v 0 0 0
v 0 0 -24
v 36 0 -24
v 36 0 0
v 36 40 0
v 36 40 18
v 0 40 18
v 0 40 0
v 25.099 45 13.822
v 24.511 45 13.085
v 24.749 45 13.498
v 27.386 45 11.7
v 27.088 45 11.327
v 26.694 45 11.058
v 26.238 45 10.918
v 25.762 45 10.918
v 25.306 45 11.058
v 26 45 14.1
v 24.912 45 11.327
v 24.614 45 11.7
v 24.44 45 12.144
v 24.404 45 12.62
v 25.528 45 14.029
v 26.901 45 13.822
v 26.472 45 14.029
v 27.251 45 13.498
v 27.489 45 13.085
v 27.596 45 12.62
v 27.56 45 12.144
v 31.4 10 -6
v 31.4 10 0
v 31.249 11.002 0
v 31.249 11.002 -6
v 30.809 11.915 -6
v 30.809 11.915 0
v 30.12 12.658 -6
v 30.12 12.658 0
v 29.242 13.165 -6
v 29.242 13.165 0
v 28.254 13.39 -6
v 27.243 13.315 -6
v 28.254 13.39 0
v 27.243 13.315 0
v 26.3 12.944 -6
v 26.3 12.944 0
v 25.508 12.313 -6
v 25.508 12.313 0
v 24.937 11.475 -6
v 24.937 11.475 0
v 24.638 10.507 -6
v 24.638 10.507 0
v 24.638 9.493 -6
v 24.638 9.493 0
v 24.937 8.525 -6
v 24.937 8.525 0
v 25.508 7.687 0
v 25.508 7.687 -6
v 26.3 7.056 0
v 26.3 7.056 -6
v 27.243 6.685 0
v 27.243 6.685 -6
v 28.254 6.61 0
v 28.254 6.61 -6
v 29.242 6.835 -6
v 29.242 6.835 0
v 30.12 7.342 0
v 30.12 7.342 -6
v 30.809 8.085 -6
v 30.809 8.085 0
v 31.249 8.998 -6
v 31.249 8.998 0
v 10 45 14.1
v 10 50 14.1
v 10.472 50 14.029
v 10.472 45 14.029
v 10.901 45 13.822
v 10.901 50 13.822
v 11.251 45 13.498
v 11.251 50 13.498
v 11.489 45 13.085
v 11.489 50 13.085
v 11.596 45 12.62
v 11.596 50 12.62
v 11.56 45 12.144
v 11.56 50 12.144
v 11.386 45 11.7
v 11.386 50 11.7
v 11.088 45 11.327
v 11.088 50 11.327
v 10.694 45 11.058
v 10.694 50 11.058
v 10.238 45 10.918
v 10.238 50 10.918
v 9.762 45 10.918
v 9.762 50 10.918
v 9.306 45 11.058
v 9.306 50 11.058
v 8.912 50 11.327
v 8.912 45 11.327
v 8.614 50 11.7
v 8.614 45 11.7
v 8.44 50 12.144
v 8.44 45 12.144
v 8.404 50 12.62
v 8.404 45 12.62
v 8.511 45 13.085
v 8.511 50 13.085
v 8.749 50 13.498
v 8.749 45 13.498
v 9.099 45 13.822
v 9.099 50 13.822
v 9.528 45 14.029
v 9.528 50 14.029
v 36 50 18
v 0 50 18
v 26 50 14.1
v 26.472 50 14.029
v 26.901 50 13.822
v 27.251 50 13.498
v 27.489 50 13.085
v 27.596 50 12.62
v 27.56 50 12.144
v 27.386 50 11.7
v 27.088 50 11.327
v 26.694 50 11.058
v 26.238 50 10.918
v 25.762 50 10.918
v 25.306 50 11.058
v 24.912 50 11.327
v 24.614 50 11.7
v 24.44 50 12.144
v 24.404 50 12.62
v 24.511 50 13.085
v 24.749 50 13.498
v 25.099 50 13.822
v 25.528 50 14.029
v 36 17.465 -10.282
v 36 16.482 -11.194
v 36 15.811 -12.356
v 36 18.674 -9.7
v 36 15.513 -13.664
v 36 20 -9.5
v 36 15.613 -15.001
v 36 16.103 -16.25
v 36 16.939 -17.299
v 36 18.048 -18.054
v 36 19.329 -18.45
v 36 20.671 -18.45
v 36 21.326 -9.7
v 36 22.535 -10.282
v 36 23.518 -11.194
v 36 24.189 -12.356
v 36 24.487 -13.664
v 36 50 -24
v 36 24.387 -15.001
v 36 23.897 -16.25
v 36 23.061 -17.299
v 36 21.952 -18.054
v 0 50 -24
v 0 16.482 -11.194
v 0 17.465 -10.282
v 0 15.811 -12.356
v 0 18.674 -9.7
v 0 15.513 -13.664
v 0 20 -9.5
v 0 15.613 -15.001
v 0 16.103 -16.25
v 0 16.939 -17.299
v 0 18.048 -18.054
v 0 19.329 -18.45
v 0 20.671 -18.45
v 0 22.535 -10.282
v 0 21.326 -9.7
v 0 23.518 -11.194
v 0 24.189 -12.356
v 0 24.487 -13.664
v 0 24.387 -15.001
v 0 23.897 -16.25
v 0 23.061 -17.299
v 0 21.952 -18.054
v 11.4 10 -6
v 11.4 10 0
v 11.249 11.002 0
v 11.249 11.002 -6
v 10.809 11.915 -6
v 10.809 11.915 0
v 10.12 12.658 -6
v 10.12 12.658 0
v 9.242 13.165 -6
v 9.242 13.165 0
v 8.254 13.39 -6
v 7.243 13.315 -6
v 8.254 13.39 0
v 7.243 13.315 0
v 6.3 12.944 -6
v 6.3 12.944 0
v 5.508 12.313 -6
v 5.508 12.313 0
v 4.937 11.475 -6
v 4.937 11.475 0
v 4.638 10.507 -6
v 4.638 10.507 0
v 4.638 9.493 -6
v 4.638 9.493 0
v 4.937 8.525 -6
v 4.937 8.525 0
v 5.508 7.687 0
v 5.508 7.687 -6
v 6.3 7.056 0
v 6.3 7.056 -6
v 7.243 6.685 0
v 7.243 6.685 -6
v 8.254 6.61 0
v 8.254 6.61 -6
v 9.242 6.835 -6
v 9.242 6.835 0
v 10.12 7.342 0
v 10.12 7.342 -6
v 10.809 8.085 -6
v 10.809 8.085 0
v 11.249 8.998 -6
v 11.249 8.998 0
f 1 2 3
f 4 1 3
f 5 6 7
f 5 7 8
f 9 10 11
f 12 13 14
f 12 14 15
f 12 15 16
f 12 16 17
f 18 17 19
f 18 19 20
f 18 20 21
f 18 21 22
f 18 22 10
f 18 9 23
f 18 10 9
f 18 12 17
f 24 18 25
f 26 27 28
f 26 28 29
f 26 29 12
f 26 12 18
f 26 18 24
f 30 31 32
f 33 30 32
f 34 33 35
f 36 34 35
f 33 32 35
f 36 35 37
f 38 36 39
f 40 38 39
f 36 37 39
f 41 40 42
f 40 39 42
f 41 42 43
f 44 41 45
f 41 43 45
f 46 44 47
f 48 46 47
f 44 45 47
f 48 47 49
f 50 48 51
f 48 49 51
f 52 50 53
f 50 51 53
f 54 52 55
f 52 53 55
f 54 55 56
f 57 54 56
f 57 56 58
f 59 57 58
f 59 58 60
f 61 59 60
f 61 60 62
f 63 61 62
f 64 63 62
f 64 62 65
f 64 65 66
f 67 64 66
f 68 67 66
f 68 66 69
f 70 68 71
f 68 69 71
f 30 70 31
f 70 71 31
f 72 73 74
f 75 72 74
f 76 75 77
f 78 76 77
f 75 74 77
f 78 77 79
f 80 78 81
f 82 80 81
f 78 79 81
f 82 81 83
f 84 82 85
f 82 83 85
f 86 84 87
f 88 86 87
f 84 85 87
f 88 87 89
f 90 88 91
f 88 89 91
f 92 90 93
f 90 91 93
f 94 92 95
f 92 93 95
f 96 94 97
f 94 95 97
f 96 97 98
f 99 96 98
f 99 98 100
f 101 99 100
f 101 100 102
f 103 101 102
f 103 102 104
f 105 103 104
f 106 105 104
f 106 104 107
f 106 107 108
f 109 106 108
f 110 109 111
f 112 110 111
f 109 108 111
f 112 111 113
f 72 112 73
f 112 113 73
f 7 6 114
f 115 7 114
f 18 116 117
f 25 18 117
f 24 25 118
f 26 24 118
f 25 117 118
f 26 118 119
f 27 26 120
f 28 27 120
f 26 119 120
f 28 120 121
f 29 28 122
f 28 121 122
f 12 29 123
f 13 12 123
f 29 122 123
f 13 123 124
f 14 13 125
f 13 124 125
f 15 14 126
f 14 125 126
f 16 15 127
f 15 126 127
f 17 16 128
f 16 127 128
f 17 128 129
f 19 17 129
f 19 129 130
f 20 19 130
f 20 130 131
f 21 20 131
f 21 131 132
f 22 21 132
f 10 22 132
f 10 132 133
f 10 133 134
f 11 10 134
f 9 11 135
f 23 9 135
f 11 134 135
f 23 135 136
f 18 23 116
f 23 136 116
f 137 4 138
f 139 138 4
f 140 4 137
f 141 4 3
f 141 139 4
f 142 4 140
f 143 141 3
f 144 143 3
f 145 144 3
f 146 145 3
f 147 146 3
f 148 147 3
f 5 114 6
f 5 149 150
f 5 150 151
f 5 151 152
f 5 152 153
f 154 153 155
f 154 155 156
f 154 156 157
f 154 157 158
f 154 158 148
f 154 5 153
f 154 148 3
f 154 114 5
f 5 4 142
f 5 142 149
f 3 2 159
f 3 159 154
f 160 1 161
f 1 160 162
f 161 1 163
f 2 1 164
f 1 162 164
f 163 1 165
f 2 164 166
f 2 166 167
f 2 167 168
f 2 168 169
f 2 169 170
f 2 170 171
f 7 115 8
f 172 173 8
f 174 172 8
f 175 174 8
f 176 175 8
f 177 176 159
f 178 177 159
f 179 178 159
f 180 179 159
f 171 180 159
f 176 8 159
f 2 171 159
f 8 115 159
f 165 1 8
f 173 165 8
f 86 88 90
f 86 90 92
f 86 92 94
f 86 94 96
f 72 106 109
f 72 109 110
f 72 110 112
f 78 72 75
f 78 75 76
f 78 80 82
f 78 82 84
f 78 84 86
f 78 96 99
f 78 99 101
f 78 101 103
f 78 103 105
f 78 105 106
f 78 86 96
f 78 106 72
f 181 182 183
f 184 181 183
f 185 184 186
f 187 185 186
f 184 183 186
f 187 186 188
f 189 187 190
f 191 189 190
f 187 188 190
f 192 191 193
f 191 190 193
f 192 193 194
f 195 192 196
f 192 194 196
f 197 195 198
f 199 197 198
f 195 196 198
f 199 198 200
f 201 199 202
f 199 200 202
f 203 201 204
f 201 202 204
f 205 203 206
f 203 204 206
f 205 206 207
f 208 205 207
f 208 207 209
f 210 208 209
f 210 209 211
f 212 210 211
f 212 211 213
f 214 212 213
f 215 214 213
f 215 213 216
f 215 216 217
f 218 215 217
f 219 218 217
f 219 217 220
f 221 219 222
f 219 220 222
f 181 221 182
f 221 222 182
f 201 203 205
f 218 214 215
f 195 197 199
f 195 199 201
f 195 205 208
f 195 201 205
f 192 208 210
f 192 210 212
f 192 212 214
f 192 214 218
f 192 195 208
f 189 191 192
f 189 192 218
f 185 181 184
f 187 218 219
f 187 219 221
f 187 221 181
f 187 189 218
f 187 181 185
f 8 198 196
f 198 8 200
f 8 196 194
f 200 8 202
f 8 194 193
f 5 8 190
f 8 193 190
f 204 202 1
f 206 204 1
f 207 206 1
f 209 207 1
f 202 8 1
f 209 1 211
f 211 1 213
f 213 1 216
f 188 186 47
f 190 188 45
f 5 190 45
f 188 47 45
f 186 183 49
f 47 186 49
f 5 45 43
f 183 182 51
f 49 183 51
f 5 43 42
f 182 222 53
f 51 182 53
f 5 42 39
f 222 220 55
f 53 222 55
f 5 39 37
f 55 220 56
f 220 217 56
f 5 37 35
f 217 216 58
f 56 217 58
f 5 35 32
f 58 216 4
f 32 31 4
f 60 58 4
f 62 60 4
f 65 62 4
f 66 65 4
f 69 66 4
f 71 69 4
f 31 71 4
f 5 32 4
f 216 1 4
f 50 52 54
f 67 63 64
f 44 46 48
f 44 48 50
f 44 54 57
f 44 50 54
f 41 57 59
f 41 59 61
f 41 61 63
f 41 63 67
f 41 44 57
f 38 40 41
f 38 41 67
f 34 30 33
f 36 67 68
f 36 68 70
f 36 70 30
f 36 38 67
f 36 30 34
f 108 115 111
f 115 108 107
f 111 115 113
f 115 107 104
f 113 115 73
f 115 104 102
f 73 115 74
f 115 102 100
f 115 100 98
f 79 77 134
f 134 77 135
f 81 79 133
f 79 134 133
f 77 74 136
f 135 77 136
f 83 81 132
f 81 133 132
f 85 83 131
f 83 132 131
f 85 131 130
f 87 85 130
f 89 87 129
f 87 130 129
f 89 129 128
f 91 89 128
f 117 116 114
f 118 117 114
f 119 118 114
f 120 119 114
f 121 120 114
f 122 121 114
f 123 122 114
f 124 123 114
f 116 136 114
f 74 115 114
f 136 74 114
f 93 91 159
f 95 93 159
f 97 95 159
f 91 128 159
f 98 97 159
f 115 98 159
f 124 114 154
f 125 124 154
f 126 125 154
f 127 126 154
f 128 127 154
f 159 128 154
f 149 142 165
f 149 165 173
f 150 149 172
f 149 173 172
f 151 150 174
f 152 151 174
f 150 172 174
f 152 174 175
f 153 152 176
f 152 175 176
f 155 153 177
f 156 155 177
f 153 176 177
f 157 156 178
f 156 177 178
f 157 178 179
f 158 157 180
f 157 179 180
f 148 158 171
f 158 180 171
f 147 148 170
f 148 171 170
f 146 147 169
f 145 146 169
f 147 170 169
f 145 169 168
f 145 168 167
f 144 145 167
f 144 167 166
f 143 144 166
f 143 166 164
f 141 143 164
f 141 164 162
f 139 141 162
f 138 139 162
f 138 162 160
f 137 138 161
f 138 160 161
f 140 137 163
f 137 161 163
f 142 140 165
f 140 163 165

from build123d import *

# Parameters (mm, degrees)
SKETCH_1_W          = 36
SKETCH_1_H          = 24
EXTRUDE_1_DEPTH     = 50
SKETCH_2_R          = 4.5
CUT_EXTRUDE_1_DEPTH = 36
SKETCH_3_R          = 3.4
CUT_EXTRUDE_2_DEPTH = 6
SKETCH_5_W          = 18
SKETCH_5_H          = 10
EXTRUDE_2_DEPTH     = 36
SKETCH_6_R          = 1.6
CUT_EXTRUDE_3_DEPTH = 5


with BuildPart() as part:
    # 草图1 → 凸台-拉伸1 (new body)
    with BuildSketch(Plane(origin=(0, 0, 0), x_dir=(1, 0, 0), z_dir=(0, 1, 0))):
        with Locations((18, 12)):
            Rectangle(SKETCH_1_W, SKETCH_1_H)
    extrude(amount=EXTRUDE_1_DEPTH)

    # 草图2 → 切除-拉伸1 (cut)
    with BuildSketch(Plane.ZY):
        with Locations((-14, 20)):
            Circle(SKETCH_2_R)
    extrude(amount=-CUT_EXTRUDE_1_DEPTH, mode=Mode.SUBTRACT)

    # 草图3 → 切除-拉伸2 (cut)
    with BuildSketch(Plane.XY):
        with Locations((8, 10)):
            Circle(SKETCH_3_R)
        with Locations((28, 10)):
            Circle(SKETCH_3_R)
    extrude(amount=-CUT_EXTRUDE_2_DEPTH, mode=Mode.SUBTRACT)

    # 草图5 → 凸台-拉伸2 (add)
    with BuildSketch(Plane(origin=(36, 0, 0), x_dir=(0, 0, -1), z_dir=(1, 0, 0))):
        with Locations((-9, 45)):
            Rectangle(SKETCH_5_W, SKETCH_5_H)
    extrude(amount=-EXTRUDE_2_DEPTH)

    # 草图6 → 切除-拉伸3 (cut)
    with BuildSketch(Plane(origin=(0, 50, 0), x_dir=(1, 0, 0), z_dir=(0, 1, 0))):
        with Locations(Location((26, -12.5, 0), (0, 0, 270))):
            Circle(SKETCH_6_R)
        with Locations(Location((10, -12.5, 0), (0, 0, 270))):
            Circle(SKETCH_6_R)
    extrude(amount=-CUT_EXTRUDE_3_DEPTH, mode=Mode.SUBTRACT)


solid = part.part
